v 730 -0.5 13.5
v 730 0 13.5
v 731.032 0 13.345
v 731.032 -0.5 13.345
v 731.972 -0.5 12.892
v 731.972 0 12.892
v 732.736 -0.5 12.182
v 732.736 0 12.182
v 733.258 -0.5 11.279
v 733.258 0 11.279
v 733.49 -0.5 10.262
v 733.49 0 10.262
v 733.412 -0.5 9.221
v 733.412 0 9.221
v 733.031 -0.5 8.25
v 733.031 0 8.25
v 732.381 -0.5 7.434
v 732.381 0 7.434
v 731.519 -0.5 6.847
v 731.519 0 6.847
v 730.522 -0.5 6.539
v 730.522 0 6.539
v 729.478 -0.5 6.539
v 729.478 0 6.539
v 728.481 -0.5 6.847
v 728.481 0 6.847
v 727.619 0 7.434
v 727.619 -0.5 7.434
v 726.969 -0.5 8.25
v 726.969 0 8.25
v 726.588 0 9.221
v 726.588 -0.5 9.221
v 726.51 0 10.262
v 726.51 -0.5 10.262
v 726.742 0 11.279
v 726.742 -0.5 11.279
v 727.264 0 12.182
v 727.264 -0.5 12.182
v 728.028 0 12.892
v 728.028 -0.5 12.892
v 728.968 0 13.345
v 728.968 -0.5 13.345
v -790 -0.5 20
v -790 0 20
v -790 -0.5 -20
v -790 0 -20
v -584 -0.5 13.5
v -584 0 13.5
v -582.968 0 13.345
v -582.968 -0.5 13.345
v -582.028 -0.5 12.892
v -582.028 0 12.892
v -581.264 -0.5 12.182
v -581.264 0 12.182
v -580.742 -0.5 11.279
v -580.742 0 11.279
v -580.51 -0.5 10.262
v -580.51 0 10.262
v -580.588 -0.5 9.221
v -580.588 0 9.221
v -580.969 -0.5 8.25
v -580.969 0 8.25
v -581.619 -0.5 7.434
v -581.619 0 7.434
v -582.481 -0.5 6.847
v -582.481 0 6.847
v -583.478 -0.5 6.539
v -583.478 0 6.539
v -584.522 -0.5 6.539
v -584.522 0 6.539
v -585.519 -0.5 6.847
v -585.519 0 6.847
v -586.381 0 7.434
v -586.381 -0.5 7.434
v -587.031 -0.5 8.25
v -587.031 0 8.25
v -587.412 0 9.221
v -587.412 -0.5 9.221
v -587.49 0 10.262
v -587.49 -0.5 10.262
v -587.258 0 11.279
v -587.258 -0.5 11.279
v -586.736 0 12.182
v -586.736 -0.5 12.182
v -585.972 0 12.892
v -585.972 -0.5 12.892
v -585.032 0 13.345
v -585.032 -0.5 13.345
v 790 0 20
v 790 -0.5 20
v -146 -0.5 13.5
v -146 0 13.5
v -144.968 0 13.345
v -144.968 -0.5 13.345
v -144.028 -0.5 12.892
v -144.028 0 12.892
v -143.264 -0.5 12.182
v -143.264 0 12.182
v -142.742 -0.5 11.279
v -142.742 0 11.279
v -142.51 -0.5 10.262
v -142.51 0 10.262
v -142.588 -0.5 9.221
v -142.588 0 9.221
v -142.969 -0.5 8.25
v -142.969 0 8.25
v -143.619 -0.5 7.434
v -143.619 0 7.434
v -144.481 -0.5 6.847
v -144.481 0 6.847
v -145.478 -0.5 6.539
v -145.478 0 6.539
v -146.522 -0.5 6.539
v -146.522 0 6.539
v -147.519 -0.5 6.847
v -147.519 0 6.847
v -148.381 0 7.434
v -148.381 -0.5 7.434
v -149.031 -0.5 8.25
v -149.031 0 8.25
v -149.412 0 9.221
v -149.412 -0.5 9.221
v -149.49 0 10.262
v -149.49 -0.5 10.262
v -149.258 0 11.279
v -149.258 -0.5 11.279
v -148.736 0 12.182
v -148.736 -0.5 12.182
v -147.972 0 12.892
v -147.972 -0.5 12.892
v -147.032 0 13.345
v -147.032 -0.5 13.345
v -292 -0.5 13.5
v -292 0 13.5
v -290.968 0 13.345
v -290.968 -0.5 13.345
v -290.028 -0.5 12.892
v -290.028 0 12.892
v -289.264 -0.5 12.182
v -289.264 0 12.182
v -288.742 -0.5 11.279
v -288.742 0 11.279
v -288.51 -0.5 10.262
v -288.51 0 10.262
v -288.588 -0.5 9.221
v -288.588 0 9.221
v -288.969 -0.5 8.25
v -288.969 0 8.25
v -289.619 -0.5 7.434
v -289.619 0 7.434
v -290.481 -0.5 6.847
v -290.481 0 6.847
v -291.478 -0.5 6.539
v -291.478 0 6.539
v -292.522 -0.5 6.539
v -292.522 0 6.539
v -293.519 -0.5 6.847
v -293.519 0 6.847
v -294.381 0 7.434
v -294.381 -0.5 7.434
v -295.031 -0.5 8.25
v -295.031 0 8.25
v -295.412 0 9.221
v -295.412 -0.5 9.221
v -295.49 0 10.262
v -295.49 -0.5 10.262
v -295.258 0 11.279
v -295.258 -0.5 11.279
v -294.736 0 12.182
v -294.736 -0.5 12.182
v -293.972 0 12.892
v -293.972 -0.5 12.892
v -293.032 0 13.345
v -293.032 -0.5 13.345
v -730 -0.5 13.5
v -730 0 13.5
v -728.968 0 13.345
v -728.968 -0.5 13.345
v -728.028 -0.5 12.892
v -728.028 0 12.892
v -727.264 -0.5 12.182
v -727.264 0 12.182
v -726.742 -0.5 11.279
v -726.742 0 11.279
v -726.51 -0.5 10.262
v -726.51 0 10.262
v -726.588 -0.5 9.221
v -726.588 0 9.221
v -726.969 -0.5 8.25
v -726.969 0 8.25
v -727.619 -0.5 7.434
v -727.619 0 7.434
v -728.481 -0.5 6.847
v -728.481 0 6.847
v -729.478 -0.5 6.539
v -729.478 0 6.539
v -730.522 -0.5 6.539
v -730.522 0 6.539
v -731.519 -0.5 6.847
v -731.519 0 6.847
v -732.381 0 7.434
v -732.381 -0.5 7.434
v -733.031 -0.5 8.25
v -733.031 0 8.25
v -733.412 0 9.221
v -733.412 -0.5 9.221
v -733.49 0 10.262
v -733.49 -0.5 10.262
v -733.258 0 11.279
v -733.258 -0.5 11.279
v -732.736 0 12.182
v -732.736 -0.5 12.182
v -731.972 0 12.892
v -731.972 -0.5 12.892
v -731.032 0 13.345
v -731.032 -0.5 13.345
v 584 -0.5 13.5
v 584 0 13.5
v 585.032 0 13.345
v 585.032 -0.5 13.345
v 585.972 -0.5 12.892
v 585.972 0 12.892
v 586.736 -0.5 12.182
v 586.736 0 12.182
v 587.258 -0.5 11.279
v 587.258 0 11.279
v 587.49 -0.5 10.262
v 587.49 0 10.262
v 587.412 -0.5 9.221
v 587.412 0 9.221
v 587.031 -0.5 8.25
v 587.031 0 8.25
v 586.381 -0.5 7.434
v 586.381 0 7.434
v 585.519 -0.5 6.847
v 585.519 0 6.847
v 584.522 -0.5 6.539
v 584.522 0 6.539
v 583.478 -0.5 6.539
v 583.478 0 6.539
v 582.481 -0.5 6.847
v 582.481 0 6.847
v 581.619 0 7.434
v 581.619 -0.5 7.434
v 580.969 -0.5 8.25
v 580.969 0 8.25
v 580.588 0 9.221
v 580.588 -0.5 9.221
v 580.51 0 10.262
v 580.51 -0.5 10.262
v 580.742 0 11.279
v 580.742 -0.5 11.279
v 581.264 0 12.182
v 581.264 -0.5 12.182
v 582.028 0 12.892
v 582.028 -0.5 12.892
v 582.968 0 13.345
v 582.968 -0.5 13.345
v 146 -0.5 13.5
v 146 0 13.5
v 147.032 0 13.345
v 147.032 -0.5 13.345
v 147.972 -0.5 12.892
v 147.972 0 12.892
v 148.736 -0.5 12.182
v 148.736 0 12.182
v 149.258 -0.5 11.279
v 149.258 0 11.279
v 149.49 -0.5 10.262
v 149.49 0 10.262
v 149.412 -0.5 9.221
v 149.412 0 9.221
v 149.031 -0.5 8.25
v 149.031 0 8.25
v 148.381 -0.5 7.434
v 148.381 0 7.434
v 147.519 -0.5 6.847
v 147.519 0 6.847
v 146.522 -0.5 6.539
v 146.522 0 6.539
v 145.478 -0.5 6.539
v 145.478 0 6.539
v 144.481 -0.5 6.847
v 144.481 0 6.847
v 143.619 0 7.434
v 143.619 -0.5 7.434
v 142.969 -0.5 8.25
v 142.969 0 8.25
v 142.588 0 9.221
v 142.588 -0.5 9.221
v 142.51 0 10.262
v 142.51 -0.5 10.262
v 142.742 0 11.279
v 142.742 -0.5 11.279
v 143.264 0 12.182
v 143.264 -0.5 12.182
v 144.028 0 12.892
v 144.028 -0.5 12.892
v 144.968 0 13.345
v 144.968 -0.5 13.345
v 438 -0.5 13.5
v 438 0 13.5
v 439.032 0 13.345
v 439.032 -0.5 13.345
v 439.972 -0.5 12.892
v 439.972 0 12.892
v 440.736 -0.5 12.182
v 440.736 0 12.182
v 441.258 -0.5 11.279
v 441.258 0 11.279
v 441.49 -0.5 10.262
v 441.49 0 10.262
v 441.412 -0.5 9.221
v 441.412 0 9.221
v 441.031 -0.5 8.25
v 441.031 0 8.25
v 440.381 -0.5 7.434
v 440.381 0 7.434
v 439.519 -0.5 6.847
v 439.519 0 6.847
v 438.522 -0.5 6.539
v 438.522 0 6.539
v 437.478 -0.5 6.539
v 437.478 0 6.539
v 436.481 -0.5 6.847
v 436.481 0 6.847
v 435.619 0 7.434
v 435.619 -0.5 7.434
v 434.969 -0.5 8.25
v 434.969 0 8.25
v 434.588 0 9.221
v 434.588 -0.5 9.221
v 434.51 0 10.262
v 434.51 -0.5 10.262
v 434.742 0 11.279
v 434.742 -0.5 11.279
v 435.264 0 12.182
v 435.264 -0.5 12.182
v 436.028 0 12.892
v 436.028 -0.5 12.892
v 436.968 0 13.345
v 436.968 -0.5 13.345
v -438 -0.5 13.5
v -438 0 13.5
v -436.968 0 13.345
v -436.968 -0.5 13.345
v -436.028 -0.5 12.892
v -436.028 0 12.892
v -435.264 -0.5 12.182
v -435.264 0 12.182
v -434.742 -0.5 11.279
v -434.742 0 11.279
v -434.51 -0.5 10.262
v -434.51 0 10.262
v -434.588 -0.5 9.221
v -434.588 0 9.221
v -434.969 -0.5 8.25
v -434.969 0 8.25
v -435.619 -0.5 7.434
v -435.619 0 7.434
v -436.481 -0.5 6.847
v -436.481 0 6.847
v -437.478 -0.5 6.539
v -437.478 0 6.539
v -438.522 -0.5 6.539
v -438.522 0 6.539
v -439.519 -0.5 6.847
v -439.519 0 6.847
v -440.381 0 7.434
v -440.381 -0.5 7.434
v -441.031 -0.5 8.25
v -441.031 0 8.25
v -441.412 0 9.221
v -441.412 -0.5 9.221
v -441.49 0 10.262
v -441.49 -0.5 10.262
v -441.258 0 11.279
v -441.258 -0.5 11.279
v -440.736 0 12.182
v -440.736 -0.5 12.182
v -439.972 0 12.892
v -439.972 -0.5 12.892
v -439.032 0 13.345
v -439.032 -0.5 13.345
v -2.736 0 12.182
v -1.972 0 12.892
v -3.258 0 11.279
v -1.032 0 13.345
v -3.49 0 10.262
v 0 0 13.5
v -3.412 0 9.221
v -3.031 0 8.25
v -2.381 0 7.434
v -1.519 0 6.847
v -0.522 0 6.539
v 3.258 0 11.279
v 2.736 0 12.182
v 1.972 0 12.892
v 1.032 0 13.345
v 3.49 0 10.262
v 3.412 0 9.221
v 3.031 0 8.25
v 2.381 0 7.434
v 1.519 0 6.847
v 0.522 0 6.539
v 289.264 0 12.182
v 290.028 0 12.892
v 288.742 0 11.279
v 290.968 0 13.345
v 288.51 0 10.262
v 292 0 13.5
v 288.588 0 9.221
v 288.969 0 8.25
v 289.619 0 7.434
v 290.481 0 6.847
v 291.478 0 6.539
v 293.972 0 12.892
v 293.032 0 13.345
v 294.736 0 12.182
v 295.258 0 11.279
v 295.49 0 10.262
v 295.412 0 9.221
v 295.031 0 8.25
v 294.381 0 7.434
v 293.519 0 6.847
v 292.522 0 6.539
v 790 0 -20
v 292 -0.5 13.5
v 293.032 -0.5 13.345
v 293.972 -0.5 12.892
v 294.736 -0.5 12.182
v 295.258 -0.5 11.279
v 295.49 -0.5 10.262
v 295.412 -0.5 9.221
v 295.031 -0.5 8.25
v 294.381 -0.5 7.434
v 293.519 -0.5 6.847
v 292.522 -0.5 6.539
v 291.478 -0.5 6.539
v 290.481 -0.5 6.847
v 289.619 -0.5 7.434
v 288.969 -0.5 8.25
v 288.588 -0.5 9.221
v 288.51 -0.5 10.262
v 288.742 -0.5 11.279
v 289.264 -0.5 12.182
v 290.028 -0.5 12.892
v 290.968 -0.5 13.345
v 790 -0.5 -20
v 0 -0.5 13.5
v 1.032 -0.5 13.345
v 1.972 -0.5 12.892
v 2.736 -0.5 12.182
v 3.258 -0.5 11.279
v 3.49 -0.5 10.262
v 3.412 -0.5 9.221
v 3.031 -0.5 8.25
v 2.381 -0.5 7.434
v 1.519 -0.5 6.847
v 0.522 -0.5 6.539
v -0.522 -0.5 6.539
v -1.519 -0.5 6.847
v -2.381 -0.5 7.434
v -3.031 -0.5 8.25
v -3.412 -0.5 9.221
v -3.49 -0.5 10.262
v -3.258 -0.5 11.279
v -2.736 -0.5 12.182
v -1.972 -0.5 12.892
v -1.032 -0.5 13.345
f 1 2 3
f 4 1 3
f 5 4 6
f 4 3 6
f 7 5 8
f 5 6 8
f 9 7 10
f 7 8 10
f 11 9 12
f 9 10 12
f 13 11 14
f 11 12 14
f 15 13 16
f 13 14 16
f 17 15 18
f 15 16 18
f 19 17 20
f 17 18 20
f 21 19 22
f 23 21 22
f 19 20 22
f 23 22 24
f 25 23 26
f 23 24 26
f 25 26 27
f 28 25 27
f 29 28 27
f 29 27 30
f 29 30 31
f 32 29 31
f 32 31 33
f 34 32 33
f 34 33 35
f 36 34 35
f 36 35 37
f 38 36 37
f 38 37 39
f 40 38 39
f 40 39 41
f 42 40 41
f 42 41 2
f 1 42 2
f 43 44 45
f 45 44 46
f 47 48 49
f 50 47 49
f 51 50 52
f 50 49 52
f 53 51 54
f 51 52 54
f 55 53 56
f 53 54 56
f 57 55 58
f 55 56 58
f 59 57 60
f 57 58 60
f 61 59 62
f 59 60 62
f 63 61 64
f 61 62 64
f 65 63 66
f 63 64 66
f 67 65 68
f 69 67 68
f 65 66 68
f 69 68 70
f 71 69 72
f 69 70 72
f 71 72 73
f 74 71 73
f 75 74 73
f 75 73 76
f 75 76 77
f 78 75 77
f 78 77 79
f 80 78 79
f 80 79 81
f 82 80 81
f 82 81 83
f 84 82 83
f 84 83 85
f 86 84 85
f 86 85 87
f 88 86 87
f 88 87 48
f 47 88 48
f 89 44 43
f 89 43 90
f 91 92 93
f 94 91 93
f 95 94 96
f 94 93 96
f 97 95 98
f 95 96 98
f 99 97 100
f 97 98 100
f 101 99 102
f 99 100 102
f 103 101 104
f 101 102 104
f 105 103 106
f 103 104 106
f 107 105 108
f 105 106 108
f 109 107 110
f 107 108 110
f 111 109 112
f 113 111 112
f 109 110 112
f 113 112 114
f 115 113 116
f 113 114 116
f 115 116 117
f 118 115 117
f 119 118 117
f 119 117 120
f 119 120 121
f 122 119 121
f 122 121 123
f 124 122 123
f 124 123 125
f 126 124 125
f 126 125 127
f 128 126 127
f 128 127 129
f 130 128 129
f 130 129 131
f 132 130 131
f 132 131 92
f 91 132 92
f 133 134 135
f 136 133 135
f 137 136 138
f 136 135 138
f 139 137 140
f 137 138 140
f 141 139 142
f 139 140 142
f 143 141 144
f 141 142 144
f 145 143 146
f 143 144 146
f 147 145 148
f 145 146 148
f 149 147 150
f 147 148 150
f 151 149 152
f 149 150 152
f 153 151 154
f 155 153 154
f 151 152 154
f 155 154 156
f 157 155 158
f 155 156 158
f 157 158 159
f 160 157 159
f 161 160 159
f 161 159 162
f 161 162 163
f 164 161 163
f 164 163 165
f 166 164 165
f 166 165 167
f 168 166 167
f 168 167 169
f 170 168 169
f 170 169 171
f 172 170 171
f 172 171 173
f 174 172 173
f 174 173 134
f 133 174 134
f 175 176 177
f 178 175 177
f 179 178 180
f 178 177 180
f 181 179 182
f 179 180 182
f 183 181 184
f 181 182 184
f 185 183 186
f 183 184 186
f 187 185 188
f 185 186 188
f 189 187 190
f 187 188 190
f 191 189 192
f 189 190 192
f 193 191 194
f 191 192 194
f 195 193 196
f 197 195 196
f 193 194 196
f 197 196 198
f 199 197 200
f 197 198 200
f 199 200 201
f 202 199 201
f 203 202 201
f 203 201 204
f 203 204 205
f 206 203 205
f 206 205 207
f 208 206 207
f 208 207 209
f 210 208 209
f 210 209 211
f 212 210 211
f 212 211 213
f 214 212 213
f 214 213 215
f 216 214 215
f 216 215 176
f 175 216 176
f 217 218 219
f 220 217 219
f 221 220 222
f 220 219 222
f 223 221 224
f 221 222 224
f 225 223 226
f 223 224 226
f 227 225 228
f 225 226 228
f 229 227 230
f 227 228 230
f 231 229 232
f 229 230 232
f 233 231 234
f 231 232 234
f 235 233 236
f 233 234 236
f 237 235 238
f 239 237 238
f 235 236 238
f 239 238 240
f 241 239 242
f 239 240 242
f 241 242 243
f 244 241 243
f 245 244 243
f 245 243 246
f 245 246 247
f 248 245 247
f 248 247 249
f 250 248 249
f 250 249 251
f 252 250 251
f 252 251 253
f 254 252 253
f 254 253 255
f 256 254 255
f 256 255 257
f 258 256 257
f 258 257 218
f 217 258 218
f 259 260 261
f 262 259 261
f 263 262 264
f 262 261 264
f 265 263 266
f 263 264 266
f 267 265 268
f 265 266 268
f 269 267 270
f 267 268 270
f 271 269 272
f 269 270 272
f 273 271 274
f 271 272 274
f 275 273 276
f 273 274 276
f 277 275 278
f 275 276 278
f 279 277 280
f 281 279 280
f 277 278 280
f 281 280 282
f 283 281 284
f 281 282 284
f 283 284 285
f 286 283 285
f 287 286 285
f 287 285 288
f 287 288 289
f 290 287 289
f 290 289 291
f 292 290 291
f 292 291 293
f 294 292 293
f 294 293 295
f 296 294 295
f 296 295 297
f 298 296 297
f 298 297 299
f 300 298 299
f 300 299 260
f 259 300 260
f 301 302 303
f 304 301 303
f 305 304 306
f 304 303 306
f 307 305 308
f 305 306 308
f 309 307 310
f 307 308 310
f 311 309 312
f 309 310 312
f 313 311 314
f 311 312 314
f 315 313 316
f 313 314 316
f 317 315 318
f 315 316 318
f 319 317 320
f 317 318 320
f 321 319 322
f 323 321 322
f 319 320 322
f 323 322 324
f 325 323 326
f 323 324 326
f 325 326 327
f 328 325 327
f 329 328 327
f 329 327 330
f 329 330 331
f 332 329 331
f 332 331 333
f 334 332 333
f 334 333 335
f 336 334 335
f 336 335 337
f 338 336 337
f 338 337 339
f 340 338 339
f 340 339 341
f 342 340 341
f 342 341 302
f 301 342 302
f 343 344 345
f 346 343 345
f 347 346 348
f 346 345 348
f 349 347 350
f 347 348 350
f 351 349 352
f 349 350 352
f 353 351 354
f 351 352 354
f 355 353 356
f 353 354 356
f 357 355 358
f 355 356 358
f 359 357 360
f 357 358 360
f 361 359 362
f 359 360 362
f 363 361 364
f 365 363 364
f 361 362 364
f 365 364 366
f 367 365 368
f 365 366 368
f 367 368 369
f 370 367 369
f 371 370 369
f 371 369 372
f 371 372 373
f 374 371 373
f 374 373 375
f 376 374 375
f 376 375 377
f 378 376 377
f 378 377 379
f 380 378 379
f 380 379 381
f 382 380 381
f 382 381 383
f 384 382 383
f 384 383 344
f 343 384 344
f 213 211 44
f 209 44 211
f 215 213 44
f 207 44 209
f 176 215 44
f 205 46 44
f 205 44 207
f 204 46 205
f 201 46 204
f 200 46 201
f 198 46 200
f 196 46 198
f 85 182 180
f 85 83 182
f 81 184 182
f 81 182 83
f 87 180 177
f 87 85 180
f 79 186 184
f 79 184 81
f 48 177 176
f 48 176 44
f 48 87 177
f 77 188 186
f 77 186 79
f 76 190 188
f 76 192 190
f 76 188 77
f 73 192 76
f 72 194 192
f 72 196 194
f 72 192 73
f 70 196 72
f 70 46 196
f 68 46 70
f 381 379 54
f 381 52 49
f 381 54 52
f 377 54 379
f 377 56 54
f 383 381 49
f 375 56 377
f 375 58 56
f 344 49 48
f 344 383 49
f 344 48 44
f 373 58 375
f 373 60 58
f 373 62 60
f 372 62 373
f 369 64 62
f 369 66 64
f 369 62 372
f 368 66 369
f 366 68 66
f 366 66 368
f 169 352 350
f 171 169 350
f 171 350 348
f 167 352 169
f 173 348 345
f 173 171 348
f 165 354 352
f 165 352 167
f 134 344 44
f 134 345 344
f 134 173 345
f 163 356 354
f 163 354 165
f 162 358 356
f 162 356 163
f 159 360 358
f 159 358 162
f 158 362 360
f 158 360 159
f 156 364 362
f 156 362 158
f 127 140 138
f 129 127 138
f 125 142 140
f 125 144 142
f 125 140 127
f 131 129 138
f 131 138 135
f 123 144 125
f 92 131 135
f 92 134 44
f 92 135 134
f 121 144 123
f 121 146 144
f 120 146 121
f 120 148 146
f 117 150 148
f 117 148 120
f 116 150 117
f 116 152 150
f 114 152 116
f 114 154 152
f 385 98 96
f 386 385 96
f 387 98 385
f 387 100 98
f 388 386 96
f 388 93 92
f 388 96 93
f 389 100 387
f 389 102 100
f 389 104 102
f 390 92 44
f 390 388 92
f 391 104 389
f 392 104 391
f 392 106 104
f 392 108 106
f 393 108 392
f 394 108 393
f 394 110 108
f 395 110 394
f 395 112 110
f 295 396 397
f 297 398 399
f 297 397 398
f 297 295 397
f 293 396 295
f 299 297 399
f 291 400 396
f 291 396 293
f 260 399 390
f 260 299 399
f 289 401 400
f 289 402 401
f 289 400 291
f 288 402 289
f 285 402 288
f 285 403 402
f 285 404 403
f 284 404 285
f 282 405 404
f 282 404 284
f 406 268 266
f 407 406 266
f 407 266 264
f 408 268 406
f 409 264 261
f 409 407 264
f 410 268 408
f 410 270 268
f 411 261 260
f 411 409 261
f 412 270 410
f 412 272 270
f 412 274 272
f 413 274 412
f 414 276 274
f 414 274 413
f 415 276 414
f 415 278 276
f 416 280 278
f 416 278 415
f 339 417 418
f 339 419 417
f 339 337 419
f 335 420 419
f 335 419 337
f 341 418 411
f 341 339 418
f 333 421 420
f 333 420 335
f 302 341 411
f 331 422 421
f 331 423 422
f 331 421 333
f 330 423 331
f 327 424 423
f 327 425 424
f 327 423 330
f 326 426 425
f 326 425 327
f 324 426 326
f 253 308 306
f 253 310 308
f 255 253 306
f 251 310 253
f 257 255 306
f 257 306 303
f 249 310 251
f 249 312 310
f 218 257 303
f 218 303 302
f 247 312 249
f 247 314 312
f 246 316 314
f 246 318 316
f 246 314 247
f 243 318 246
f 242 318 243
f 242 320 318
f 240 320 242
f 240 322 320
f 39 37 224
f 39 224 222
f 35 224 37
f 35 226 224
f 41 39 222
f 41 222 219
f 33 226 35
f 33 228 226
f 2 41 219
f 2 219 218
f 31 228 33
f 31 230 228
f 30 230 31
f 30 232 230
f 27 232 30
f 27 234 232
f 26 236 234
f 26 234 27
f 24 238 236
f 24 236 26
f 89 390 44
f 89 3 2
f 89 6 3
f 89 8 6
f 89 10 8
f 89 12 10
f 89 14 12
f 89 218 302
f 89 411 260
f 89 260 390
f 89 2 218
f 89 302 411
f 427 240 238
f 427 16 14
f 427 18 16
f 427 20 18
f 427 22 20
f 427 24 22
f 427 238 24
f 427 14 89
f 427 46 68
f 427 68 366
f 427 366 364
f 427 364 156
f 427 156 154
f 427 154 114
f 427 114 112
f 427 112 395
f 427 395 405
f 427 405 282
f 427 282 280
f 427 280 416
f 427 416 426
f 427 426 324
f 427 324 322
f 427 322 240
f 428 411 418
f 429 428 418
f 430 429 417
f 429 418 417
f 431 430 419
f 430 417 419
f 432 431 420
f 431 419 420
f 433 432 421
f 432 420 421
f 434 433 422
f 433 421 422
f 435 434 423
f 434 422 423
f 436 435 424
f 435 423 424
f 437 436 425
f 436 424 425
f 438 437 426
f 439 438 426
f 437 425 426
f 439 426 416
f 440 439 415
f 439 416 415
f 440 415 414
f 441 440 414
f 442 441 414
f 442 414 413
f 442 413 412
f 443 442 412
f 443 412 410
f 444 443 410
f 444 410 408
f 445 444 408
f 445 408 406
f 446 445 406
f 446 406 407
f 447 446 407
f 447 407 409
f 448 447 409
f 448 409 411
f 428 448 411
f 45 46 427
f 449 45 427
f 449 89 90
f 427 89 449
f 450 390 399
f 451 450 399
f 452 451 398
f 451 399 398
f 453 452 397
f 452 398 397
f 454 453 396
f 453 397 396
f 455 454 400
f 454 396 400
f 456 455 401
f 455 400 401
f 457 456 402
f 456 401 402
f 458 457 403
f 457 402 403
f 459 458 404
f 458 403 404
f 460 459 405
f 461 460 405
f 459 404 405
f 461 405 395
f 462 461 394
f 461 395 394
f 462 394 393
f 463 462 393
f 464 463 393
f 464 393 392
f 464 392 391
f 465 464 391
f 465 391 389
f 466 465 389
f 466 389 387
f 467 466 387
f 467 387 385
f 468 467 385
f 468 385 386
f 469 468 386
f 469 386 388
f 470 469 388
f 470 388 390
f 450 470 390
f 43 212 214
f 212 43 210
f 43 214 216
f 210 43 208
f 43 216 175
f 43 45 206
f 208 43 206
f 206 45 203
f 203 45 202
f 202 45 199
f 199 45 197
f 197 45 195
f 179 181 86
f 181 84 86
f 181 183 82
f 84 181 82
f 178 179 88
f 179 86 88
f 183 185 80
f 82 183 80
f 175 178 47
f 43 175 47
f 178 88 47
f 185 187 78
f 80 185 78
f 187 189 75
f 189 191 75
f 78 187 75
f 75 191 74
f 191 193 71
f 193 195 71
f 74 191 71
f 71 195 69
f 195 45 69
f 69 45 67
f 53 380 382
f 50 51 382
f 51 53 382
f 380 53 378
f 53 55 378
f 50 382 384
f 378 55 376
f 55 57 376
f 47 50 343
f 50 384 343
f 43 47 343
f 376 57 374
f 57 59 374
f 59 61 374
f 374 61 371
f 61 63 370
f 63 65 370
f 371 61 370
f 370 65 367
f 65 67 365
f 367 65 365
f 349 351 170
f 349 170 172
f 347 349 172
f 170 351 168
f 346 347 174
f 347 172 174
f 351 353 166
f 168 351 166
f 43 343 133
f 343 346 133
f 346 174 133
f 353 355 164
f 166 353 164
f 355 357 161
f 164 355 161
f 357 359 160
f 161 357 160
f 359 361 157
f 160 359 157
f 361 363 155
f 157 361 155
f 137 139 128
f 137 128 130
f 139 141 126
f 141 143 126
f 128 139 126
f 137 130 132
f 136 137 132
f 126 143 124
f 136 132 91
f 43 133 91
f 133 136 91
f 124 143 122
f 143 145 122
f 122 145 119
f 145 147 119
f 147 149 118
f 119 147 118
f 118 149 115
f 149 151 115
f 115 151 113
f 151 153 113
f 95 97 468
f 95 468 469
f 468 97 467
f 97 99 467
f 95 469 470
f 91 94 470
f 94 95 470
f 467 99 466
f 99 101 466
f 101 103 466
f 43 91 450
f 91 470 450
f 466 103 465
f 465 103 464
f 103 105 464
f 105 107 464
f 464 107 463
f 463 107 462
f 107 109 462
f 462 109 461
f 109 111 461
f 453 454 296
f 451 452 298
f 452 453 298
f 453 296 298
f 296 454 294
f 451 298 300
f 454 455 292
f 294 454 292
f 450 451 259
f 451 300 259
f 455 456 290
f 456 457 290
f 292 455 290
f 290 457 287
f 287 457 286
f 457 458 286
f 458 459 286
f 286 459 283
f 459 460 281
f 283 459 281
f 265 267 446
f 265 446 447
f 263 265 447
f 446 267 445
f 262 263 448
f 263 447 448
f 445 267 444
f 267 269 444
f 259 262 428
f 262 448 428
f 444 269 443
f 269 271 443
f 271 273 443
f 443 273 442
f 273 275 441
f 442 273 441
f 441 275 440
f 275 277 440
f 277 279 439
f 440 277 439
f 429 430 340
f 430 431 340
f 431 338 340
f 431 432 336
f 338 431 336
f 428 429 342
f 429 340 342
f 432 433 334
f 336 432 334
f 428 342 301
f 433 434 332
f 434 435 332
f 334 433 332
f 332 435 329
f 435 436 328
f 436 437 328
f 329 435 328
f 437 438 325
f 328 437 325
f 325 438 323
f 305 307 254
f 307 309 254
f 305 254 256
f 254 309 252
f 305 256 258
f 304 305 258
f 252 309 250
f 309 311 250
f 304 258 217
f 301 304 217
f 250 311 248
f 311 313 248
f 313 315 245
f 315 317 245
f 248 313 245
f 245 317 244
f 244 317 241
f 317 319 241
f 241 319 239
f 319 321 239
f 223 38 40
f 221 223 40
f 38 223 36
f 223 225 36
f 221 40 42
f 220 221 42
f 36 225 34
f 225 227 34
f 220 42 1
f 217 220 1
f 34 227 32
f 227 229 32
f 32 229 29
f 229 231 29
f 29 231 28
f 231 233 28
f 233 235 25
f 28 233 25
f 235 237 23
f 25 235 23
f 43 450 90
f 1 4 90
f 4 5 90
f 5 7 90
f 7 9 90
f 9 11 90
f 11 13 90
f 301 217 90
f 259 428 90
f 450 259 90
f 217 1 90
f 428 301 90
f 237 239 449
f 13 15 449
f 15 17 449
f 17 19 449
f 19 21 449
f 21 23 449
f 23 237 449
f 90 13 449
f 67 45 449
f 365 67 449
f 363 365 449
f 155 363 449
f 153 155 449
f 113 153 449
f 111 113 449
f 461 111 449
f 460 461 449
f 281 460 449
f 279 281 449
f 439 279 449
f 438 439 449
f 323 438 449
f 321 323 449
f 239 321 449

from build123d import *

# Parameters (mm, degrees)
SKETCH1_W           = 1580
SKETCH1_H           = 40
BASE_FLANGE1_DEPTH  = 0.5
SKETCH6_R           = 3.5
CUT_EXTRUDE1_DEPTH  = 10
LPATTERN1_COUNT     = 6
LPATTERN1_PITCH     = 146
LPATTERN1_COL_COUNT = 6
LPATTERN1_COL_PITCH = 146


# Sheet-metal steps are written as plain solids
with BuildPart() as part:
    # Sketch1 → Base-Flange1 (new body)
    with BuildSketch(Plane(origin=(0, 0, 0), x_dir=(1, 0, 0), z_dir=(0, 1, 0))):
        Rectangle(SKETCH1_W, SKETCH1_H)
    extrude(amount=-BASE_FLANGE1_DEPTH)

    # Sketch6 → Cut-Extrude1 (cut)
    with BuildSketch(Plane(origin=(0, 0, 0), x_dir=(1, 0, 0), z_dir=(0, 1, 0))):
        with Locations(Location((0, -10, 0), (0, 0, 270))):
            Circle(SKETCH6_R)
    cut_extrude1 = extrude(amount=-CUT_EXTRUDE1_DEPTH, mode=Mode.SUBTRACT)

    # LPattern1: Cut-Extrude1 ×6
    with Locations(*[(-i * LPATTERN1_PITCH, 0, 0) for i in range(1, LPATTERN1_COUNT)]):
        add(cut_extrude1, mode=Mode.SUBTRACT)

    # LPattern1 col: Cut-Extrude1 ×6
    with Locations(*[(i * LPATTERN1_COL_PITCH, 0, 0) for i in range(1, LPATTERN1_COL_COUNT)]):
        add(cut_extrude1, mode=Mode.SUBTRACT)


solid = part.part
